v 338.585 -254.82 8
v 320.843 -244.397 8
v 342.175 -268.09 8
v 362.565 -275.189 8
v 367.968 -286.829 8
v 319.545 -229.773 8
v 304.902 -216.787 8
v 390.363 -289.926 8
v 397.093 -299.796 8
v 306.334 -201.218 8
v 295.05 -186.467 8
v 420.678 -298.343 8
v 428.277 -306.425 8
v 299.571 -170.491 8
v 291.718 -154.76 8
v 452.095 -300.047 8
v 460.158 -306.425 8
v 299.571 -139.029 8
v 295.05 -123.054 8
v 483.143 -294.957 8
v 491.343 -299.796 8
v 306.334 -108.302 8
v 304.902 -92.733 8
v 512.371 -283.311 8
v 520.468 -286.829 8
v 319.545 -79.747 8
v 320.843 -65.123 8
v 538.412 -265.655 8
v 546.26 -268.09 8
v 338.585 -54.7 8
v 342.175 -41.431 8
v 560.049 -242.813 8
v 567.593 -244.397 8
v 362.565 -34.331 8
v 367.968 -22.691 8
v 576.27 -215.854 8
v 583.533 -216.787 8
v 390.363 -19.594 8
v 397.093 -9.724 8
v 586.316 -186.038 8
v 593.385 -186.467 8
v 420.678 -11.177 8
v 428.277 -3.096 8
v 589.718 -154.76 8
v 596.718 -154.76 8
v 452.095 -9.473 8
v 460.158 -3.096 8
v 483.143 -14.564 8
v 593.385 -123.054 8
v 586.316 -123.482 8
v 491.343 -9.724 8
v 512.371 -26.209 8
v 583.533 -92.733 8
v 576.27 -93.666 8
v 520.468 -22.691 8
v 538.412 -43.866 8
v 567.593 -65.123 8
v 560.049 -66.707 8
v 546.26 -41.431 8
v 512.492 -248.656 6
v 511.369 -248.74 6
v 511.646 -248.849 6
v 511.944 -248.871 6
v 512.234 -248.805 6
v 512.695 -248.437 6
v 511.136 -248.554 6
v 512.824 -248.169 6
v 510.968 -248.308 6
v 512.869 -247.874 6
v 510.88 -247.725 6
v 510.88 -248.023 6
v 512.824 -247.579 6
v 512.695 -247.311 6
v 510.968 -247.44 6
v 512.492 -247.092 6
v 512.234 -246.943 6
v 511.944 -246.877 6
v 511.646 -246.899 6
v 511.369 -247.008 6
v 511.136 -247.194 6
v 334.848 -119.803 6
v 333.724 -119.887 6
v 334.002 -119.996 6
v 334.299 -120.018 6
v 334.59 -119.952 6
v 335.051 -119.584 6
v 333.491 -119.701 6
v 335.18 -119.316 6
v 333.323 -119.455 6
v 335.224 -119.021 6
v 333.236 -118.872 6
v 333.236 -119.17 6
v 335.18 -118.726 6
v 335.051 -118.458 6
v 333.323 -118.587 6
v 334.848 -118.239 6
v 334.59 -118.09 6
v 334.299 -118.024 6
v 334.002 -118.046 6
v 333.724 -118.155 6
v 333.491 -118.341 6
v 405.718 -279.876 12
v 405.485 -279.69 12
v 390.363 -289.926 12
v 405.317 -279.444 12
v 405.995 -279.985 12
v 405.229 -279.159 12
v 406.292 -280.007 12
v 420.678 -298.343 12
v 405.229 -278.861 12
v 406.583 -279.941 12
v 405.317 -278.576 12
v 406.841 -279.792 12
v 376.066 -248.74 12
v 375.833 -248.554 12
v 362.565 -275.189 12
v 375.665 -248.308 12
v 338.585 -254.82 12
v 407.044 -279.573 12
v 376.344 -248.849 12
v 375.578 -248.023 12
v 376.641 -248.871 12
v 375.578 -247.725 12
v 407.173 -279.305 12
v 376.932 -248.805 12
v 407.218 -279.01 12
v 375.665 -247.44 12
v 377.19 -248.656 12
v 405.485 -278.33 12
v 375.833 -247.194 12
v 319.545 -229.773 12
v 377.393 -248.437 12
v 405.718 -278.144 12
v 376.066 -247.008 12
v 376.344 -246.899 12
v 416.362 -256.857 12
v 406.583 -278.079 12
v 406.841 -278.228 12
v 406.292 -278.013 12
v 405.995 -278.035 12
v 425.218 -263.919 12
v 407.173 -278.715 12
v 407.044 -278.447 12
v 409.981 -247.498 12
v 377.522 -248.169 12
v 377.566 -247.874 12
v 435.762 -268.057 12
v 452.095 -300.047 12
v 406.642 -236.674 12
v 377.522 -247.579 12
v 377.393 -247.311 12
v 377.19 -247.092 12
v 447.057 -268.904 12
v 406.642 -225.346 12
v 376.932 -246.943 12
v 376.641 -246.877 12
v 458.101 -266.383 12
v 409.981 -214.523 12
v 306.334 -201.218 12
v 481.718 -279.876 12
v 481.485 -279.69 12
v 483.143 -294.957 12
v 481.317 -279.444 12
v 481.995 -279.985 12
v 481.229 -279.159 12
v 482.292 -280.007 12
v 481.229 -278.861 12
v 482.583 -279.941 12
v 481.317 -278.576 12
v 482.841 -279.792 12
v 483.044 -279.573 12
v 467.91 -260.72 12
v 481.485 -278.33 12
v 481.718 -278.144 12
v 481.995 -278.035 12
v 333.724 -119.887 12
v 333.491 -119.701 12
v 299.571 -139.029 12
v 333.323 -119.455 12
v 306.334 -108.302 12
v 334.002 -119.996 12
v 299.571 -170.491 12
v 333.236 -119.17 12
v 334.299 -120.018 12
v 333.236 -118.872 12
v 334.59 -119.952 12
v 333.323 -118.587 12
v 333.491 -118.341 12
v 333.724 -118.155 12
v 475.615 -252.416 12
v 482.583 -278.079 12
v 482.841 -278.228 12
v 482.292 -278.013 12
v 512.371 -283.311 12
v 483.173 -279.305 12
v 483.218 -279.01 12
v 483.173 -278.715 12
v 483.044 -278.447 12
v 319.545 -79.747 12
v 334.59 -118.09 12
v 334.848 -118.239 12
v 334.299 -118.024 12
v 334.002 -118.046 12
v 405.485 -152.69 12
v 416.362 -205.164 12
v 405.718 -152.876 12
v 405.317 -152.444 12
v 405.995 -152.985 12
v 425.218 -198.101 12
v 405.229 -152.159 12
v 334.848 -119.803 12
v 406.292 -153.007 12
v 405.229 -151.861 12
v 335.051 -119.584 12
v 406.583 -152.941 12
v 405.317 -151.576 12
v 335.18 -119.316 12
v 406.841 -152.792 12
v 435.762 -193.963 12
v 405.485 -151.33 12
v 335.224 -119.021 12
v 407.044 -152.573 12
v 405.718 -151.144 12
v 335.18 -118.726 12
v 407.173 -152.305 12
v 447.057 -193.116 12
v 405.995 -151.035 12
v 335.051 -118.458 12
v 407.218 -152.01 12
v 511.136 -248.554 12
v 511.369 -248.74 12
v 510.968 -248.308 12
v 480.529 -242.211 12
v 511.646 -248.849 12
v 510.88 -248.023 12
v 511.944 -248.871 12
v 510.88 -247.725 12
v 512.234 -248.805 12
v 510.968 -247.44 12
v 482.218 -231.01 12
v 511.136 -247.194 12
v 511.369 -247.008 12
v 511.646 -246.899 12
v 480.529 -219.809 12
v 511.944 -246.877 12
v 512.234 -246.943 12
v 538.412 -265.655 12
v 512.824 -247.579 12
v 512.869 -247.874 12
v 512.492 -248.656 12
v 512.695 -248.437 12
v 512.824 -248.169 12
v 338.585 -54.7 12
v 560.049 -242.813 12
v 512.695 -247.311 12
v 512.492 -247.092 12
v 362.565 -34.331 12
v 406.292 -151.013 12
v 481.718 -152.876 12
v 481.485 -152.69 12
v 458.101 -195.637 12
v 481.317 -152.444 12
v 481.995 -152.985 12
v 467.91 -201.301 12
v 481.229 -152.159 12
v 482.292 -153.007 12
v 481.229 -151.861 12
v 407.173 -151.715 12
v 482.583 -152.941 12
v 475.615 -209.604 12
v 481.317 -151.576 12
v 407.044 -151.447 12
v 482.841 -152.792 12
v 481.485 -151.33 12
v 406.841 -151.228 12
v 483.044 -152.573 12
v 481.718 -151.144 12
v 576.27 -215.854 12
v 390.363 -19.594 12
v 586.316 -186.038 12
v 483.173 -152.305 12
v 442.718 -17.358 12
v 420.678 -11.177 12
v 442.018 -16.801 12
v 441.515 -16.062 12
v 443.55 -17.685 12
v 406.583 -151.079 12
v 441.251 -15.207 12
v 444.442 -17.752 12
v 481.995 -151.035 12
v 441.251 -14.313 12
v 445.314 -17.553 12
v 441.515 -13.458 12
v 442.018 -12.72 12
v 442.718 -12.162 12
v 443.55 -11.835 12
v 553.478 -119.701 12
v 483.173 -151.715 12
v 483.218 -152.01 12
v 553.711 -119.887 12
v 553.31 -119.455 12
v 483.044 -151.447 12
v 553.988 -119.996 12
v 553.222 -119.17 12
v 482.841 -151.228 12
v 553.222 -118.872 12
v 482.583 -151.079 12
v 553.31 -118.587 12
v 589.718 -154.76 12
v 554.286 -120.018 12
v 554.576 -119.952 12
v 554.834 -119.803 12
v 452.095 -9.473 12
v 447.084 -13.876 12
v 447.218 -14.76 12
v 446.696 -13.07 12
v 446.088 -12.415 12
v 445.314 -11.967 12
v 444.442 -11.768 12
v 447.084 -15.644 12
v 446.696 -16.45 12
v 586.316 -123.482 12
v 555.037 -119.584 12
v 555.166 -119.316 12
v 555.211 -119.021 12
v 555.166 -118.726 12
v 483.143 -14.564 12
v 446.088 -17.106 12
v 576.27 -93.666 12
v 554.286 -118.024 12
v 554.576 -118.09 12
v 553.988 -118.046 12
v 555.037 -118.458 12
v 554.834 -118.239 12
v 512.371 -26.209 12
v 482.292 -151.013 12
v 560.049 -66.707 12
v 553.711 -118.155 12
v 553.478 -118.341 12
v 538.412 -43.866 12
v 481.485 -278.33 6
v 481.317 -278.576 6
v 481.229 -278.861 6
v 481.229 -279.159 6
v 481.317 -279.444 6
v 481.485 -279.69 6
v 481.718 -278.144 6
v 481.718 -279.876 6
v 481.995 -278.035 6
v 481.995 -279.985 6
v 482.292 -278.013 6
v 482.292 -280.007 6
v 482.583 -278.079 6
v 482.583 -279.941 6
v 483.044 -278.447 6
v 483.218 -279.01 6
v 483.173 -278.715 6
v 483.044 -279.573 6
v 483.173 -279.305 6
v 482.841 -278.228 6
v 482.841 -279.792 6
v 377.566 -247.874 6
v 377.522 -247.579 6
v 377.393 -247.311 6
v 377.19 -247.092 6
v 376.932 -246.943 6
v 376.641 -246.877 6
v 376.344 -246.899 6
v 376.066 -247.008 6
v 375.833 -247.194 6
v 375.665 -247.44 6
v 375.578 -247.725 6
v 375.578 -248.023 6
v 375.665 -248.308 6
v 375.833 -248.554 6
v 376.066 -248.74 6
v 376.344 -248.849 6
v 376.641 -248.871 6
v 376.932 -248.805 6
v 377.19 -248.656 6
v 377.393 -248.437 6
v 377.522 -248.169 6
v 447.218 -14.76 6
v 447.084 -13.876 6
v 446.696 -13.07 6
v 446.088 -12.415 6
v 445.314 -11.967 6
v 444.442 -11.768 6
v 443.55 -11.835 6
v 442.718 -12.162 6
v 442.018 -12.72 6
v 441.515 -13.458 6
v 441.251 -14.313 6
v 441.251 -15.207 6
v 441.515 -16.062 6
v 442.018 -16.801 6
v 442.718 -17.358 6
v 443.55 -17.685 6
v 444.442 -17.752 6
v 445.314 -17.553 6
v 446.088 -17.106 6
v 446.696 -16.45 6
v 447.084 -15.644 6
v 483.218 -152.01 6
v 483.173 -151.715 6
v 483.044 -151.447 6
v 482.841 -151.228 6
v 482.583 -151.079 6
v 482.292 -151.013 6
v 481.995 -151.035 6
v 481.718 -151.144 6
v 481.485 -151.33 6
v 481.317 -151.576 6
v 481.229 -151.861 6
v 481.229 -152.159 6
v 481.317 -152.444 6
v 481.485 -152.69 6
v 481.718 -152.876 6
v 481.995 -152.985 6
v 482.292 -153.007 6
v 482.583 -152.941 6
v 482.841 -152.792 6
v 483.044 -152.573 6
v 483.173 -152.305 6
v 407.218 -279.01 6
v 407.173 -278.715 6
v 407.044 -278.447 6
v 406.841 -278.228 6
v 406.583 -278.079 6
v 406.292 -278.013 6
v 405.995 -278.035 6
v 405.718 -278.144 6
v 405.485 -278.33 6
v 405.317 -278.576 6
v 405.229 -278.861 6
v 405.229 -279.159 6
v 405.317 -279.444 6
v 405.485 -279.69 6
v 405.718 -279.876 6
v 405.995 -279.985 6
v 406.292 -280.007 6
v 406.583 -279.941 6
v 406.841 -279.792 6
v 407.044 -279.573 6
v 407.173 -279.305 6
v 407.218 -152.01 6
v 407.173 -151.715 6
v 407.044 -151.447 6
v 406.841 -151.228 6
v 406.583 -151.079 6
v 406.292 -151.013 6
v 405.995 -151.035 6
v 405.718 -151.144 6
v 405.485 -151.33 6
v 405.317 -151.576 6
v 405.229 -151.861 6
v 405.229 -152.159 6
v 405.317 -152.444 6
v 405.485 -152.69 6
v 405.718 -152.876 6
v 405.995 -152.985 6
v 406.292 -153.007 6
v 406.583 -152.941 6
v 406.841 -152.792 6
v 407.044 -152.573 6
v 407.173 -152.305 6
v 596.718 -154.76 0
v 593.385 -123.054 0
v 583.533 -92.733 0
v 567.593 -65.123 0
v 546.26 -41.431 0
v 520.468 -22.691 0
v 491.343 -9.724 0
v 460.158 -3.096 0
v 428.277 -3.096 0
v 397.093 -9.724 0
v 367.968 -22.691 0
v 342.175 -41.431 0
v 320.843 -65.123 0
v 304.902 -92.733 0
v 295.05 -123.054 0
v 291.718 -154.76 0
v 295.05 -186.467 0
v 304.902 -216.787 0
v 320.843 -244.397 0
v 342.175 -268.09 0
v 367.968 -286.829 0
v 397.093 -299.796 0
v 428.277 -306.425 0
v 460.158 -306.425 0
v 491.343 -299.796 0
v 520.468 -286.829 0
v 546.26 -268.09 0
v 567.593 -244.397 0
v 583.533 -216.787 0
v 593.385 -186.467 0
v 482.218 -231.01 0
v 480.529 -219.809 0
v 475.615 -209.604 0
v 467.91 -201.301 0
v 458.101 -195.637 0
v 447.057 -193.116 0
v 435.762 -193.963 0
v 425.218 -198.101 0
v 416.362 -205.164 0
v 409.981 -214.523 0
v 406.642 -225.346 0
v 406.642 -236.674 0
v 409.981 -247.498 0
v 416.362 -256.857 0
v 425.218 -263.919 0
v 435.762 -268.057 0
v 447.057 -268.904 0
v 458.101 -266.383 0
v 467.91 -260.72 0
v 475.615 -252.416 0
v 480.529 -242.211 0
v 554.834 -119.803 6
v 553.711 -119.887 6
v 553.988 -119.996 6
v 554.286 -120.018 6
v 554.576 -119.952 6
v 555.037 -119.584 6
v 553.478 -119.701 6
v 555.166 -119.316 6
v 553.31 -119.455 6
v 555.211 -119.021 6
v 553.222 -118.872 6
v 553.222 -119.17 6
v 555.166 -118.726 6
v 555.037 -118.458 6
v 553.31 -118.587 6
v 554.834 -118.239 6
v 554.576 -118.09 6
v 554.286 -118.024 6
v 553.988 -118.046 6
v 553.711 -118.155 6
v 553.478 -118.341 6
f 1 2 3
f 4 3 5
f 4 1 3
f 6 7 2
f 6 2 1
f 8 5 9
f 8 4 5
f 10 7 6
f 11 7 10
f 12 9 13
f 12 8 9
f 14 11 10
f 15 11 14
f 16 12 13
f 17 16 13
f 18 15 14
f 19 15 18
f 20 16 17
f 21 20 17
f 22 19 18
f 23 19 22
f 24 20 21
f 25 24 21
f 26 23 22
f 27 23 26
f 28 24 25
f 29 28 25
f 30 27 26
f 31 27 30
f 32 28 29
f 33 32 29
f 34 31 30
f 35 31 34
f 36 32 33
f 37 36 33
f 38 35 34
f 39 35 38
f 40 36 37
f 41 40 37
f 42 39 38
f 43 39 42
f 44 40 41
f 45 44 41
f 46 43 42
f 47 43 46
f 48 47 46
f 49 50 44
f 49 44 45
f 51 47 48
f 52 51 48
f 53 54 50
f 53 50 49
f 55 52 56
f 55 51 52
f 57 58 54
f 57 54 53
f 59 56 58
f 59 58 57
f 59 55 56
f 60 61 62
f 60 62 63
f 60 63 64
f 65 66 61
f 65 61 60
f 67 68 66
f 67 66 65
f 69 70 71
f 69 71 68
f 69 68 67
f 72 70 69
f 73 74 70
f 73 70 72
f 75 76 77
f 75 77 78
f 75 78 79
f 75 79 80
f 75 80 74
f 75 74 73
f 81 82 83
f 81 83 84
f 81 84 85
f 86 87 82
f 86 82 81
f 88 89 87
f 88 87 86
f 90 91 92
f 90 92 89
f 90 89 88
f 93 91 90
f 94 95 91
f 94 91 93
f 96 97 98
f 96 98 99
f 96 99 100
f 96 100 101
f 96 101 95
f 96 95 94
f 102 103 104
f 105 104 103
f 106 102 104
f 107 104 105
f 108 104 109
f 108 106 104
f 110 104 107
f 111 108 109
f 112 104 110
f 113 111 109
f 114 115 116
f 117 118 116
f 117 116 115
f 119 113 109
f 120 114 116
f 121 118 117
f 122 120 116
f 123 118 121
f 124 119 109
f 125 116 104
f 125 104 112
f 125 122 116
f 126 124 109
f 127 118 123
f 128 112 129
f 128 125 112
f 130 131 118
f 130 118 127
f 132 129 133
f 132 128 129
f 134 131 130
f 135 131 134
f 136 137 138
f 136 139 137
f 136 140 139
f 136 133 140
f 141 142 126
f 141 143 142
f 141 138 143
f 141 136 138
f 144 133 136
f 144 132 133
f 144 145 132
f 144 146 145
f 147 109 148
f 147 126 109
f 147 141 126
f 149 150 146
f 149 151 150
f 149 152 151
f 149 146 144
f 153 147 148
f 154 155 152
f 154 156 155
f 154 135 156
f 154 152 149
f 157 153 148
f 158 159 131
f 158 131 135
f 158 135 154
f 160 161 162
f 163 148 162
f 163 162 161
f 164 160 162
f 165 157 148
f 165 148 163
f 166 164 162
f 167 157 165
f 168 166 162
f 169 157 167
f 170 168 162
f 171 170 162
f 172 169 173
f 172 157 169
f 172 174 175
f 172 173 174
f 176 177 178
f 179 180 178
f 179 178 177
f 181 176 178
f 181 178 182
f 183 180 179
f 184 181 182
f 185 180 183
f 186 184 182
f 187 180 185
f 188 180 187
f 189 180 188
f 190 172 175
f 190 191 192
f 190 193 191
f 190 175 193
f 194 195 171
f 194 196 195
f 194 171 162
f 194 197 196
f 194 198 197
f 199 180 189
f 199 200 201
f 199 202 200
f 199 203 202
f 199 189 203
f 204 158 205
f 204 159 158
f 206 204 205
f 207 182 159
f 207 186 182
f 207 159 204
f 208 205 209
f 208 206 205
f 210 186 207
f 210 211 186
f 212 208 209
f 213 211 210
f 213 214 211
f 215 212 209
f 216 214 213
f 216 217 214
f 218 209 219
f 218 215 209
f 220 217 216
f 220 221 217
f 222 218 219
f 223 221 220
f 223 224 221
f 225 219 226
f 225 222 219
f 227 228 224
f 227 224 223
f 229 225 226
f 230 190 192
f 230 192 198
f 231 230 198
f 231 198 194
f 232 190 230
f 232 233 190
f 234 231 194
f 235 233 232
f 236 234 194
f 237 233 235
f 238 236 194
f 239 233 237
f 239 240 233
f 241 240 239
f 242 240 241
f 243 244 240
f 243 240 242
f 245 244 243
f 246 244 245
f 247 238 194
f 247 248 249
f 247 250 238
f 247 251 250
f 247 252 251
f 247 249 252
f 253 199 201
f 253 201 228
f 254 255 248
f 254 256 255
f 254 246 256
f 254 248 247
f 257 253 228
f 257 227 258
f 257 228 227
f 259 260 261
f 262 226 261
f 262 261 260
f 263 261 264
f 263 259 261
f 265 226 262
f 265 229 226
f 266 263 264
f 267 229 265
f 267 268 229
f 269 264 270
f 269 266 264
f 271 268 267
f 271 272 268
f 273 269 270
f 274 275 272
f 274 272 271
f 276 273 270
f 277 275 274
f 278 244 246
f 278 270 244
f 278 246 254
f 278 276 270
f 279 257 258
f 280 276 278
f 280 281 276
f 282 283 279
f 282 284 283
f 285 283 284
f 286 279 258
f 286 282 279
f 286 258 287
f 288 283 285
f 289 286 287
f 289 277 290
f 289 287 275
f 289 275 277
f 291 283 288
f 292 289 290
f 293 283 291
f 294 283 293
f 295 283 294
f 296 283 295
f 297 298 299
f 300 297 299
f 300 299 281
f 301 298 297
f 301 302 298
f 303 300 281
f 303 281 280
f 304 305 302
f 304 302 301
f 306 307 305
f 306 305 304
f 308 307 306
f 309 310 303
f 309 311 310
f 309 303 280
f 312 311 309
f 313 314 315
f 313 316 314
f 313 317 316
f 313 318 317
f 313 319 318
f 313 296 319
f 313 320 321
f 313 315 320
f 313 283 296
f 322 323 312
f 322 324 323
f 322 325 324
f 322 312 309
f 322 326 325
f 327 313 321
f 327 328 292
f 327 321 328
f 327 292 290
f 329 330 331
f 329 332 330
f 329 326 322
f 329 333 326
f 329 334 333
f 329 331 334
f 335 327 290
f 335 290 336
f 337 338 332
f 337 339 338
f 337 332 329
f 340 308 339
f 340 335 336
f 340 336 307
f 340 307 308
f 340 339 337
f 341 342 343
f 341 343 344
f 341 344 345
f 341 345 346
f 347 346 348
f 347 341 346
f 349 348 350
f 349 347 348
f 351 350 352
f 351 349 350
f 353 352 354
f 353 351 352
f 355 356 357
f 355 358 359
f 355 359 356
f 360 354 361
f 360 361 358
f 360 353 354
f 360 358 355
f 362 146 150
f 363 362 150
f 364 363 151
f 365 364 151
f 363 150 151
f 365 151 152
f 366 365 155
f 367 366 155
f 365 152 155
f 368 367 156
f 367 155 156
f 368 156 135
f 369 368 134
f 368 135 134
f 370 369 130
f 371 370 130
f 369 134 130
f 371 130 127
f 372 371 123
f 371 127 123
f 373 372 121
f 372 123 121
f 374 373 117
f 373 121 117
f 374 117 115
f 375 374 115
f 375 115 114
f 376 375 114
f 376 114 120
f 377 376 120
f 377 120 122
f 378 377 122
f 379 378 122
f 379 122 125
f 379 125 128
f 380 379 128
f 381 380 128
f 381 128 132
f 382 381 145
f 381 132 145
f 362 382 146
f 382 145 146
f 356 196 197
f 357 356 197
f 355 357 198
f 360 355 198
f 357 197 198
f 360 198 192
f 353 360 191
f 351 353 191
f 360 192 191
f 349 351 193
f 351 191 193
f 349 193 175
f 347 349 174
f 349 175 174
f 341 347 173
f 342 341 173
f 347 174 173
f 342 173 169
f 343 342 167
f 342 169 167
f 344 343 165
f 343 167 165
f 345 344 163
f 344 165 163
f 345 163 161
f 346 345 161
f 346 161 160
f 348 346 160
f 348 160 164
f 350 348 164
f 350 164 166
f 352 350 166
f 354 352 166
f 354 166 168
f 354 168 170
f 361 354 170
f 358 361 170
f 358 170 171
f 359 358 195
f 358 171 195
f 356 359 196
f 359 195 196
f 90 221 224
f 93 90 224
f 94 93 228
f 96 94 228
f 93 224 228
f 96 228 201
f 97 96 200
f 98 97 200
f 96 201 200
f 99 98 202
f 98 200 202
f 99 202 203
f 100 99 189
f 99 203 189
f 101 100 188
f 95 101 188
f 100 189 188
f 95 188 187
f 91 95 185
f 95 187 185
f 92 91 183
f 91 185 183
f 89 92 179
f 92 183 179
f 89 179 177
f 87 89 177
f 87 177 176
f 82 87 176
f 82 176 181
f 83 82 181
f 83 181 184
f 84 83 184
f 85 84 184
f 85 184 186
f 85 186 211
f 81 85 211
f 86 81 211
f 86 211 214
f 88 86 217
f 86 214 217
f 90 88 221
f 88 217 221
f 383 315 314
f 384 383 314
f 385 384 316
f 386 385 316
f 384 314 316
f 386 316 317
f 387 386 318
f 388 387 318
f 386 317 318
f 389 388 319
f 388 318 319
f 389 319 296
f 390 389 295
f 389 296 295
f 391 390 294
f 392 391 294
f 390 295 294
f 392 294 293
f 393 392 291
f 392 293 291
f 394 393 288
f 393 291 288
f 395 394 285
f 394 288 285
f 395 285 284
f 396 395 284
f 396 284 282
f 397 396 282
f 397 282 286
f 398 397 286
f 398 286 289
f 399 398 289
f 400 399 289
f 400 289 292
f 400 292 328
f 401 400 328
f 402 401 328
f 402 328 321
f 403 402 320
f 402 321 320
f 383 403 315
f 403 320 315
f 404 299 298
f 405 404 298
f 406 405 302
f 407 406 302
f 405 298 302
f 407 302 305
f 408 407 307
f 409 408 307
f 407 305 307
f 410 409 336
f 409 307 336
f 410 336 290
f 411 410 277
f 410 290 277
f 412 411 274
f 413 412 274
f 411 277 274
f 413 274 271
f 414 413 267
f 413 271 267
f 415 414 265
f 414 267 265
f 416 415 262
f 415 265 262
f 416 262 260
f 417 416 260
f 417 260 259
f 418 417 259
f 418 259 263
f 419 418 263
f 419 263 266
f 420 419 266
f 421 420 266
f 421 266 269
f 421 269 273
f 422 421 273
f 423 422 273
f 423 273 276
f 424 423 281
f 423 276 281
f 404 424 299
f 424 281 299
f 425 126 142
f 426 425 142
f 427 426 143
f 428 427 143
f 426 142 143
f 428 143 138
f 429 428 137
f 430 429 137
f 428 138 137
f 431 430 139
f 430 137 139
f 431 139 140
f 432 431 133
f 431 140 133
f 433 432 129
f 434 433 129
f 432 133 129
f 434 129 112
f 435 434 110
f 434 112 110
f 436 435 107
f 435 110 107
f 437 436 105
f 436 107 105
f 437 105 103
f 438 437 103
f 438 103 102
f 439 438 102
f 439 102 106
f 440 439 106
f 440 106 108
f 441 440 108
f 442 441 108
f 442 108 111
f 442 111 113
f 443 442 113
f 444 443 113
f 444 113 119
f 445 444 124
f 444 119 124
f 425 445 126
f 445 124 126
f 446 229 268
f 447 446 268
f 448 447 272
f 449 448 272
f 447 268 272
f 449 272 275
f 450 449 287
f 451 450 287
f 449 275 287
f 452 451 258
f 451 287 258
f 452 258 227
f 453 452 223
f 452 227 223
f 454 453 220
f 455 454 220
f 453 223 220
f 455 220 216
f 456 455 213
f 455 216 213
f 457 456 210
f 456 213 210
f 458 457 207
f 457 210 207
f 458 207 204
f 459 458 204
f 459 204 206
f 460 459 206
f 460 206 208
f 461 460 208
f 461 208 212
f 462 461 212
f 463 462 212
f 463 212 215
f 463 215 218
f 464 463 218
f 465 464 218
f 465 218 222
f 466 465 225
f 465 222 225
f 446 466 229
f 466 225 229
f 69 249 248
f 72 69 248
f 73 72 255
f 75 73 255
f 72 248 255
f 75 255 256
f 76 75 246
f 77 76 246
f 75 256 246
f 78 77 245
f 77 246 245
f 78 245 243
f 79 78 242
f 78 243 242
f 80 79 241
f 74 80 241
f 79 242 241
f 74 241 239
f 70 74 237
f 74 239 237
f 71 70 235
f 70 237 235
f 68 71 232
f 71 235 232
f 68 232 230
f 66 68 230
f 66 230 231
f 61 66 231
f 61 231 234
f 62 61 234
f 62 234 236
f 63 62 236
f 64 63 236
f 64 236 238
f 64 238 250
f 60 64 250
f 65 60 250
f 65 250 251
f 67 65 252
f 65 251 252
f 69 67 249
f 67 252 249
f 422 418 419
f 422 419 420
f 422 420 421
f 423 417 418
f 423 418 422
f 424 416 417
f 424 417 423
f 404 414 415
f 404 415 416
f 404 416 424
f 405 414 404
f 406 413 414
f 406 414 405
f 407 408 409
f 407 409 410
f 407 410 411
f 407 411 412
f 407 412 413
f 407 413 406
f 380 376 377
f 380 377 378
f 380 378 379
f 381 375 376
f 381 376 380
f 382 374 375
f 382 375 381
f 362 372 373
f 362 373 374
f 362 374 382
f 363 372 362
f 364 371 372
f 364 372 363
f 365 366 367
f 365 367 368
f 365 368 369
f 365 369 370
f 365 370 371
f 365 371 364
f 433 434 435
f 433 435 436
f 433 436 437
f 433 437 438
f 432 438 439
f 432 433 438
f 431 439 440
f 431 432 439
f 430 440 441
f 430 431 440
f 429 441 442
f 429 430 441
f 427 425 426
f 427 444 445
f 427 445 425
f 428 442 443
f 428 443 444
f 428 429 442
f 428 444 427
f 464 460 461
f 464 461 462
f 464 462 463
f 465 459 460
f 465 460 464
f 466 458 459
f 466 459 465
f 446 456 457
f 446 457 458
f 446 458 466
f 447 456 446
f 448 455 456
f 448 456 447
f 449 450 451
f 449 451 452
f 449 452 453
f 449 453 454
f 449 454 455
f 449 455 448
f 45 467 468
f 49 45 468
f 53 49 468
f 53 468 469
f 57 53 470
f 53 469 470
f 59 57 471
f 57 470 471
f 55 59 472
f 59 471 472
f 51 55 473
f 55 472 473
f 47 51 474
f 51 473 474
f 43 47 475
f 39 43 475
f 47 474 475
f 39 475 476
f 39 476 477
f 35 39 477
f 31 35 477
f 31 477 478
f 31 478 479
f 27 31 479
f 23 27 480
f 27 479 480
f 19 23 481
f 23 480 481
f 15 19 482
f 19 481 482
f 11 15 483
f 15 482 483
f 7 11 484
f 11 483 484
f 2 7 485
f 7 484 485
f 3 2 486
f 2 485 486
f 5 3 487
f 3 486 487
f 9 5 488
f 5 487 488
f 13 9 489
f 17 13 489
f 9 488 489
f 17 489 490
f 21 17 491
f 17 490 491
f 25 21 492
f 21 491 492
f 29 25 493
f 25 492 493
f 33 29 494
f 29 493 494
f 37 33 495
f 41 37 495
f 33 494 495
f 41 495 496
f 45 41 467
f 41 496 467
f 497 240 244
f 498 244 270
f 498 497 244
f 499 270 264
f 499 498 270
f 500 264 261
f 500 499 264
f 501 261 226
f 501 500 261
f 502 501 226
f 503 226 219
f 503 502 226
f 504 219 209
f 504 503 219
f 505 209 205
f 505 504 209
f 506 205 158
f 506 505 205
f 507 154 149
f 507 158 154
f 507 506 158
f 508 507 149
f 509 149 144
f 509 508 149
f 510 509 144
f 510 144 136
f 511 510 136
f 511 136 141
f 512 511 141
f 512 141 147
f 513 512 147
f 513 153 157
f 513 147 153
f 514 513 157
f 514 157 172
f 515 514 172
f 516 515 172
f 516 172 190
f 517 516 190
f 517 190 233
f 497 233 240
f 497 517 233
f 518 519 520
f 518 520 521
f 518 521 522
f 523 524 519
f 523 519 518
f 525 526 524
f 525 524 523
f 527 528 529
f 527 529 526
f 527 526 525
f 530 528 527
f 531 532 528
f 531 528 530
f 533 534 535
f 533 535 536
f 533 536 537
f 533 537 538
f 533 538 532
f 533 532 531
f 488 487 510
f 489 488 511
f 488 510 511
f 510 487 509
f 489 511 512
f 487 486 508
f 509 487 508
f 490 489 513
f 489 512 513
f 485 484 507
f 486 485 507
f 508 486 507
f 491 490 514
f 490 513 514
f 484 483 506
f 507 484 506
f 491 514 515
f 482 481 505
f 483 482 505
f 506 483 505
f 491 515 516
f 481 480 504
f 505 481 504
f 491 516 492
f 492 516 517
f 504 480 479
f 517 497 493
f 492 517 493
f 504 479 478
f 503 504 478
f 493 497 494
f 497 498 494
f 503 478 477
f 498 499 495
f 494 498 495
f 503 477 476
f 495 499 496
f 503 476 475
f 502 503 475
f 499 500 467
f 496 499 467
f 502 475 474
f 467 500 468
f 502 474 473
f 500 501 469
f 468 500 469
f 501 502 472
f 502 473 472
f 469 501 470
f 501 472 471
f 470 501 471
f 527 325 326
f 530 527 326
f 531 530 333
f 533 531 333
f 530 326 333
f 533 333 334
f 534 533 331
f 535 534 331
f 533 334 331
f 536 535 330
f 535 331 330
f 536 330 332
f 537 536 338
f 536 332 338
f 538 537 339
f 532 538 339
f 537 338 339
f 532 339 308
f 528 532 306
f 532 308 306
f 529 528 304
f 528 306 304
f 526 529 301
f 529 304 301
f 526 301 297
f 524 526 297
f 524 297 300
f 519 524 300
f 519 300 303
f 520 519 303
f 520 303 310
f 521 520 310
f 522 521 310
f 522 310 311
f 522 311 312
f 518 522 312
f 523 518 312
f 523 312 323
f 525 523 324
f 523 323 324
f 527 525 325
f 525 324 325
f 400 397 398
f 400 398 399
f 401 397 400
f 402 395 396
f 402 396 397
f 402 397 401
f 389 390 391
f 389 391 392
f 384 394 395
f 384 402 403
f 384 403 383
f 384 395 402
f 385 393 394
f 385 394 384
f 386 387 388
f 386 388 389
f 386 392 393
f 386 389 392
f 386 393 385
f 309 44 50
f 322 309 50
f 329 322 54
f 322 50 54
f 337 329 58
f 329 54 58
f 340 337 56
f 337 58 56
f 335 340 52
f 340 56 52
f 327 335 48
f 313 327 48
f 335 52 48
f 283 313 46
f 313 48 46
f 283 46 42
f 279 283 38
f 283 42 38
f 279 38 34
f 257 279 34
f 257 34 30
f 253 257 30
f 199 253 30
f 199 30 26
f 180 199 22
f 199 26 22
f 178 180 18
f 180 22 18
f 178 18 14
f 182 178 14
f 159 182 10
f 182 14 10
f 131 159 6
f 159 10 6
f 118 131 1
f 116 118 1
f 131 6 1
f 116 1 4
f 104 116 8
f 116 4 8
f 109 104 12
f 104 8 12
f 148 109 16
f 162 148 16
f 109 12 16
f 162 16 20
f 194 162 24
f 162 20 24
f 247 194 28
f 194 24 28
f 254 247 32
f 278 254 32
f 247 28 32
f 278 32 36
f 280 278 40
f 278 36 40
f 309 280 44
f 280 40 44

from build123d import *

# Parameters (mm, degrees)
SKETCH058_R     = 152.5
PAD_DEPTH       = 8
SKETCH059_R     = 145.5
PAD017_DEPTH    = 4
SKETCH003_R     = 38
POCKET_DEPTH    = 12.001
SKETCH054_R     = 3
SKETCH054_R_2   = 1
POCKET019_DEPTH = 6


with BuildPart() as part:
    # Sketch058 → Pad (new body)
    with BuildSketch(Plane.XY):
        Circle(SKETCH058_R)
    extrude(amount=PAD_DEPTH)

    # Sketch059 (on DatumPlane) → Pad017 (join)
    with BuildSketch(Plane.XY.offset(8)):
        Circle(SKETCH059_R)
    extrude(amount=PAD017_DEPTH)

    # Sketch003 → Pocket (cut, through all)
    with BuildSketch(Plane.XY):
        with Locations((0, -76.25)):
            Circle(SKETCH003_R)
    extrude(amount=POCKET_DEPTH, mode=Mode.SUBTRACT)

    # Sketch054 → Pocket019 (cut)
    with BuildSketch(Plane.XY.offset(12)):
        with Locations((0, 140)):
            Circle(SKETCH054_R)
        with Locations((109.993235, 35.738968)):
            Circle(SKETCH054_R_2)
        with Locations((67.651258, -93.113968)):
            Circle(SKETCH054_R_2)
        with Locations((-67.651258, -93.113968)):
            Circle(SKETCH054_R_2)
        with Locations((-109.993235, 35.738968)):
            Circle(SKETCH054_R_2)
        with Locations((-38, 2.75)):
            Circle(SKETCH054_R_2)
        with Locations((38, 2.75)):
            Circle(SKETCH054_R_2)
        with Locations((-38, -124.25)):
            Circle(SKETCH054_R_2)
        with Locations((38, -124.25)):
            Circle(SKETCH054_R_2)
    extrude(amount=-POCKET019_DEPTH, mode=Mode.SUBTRACT)


with BuildPart() as part_1:
    # Body placement: moved
    add(part.part.moved(Location((444.217634, -154.760103, 0))))


solid = part_1.part
